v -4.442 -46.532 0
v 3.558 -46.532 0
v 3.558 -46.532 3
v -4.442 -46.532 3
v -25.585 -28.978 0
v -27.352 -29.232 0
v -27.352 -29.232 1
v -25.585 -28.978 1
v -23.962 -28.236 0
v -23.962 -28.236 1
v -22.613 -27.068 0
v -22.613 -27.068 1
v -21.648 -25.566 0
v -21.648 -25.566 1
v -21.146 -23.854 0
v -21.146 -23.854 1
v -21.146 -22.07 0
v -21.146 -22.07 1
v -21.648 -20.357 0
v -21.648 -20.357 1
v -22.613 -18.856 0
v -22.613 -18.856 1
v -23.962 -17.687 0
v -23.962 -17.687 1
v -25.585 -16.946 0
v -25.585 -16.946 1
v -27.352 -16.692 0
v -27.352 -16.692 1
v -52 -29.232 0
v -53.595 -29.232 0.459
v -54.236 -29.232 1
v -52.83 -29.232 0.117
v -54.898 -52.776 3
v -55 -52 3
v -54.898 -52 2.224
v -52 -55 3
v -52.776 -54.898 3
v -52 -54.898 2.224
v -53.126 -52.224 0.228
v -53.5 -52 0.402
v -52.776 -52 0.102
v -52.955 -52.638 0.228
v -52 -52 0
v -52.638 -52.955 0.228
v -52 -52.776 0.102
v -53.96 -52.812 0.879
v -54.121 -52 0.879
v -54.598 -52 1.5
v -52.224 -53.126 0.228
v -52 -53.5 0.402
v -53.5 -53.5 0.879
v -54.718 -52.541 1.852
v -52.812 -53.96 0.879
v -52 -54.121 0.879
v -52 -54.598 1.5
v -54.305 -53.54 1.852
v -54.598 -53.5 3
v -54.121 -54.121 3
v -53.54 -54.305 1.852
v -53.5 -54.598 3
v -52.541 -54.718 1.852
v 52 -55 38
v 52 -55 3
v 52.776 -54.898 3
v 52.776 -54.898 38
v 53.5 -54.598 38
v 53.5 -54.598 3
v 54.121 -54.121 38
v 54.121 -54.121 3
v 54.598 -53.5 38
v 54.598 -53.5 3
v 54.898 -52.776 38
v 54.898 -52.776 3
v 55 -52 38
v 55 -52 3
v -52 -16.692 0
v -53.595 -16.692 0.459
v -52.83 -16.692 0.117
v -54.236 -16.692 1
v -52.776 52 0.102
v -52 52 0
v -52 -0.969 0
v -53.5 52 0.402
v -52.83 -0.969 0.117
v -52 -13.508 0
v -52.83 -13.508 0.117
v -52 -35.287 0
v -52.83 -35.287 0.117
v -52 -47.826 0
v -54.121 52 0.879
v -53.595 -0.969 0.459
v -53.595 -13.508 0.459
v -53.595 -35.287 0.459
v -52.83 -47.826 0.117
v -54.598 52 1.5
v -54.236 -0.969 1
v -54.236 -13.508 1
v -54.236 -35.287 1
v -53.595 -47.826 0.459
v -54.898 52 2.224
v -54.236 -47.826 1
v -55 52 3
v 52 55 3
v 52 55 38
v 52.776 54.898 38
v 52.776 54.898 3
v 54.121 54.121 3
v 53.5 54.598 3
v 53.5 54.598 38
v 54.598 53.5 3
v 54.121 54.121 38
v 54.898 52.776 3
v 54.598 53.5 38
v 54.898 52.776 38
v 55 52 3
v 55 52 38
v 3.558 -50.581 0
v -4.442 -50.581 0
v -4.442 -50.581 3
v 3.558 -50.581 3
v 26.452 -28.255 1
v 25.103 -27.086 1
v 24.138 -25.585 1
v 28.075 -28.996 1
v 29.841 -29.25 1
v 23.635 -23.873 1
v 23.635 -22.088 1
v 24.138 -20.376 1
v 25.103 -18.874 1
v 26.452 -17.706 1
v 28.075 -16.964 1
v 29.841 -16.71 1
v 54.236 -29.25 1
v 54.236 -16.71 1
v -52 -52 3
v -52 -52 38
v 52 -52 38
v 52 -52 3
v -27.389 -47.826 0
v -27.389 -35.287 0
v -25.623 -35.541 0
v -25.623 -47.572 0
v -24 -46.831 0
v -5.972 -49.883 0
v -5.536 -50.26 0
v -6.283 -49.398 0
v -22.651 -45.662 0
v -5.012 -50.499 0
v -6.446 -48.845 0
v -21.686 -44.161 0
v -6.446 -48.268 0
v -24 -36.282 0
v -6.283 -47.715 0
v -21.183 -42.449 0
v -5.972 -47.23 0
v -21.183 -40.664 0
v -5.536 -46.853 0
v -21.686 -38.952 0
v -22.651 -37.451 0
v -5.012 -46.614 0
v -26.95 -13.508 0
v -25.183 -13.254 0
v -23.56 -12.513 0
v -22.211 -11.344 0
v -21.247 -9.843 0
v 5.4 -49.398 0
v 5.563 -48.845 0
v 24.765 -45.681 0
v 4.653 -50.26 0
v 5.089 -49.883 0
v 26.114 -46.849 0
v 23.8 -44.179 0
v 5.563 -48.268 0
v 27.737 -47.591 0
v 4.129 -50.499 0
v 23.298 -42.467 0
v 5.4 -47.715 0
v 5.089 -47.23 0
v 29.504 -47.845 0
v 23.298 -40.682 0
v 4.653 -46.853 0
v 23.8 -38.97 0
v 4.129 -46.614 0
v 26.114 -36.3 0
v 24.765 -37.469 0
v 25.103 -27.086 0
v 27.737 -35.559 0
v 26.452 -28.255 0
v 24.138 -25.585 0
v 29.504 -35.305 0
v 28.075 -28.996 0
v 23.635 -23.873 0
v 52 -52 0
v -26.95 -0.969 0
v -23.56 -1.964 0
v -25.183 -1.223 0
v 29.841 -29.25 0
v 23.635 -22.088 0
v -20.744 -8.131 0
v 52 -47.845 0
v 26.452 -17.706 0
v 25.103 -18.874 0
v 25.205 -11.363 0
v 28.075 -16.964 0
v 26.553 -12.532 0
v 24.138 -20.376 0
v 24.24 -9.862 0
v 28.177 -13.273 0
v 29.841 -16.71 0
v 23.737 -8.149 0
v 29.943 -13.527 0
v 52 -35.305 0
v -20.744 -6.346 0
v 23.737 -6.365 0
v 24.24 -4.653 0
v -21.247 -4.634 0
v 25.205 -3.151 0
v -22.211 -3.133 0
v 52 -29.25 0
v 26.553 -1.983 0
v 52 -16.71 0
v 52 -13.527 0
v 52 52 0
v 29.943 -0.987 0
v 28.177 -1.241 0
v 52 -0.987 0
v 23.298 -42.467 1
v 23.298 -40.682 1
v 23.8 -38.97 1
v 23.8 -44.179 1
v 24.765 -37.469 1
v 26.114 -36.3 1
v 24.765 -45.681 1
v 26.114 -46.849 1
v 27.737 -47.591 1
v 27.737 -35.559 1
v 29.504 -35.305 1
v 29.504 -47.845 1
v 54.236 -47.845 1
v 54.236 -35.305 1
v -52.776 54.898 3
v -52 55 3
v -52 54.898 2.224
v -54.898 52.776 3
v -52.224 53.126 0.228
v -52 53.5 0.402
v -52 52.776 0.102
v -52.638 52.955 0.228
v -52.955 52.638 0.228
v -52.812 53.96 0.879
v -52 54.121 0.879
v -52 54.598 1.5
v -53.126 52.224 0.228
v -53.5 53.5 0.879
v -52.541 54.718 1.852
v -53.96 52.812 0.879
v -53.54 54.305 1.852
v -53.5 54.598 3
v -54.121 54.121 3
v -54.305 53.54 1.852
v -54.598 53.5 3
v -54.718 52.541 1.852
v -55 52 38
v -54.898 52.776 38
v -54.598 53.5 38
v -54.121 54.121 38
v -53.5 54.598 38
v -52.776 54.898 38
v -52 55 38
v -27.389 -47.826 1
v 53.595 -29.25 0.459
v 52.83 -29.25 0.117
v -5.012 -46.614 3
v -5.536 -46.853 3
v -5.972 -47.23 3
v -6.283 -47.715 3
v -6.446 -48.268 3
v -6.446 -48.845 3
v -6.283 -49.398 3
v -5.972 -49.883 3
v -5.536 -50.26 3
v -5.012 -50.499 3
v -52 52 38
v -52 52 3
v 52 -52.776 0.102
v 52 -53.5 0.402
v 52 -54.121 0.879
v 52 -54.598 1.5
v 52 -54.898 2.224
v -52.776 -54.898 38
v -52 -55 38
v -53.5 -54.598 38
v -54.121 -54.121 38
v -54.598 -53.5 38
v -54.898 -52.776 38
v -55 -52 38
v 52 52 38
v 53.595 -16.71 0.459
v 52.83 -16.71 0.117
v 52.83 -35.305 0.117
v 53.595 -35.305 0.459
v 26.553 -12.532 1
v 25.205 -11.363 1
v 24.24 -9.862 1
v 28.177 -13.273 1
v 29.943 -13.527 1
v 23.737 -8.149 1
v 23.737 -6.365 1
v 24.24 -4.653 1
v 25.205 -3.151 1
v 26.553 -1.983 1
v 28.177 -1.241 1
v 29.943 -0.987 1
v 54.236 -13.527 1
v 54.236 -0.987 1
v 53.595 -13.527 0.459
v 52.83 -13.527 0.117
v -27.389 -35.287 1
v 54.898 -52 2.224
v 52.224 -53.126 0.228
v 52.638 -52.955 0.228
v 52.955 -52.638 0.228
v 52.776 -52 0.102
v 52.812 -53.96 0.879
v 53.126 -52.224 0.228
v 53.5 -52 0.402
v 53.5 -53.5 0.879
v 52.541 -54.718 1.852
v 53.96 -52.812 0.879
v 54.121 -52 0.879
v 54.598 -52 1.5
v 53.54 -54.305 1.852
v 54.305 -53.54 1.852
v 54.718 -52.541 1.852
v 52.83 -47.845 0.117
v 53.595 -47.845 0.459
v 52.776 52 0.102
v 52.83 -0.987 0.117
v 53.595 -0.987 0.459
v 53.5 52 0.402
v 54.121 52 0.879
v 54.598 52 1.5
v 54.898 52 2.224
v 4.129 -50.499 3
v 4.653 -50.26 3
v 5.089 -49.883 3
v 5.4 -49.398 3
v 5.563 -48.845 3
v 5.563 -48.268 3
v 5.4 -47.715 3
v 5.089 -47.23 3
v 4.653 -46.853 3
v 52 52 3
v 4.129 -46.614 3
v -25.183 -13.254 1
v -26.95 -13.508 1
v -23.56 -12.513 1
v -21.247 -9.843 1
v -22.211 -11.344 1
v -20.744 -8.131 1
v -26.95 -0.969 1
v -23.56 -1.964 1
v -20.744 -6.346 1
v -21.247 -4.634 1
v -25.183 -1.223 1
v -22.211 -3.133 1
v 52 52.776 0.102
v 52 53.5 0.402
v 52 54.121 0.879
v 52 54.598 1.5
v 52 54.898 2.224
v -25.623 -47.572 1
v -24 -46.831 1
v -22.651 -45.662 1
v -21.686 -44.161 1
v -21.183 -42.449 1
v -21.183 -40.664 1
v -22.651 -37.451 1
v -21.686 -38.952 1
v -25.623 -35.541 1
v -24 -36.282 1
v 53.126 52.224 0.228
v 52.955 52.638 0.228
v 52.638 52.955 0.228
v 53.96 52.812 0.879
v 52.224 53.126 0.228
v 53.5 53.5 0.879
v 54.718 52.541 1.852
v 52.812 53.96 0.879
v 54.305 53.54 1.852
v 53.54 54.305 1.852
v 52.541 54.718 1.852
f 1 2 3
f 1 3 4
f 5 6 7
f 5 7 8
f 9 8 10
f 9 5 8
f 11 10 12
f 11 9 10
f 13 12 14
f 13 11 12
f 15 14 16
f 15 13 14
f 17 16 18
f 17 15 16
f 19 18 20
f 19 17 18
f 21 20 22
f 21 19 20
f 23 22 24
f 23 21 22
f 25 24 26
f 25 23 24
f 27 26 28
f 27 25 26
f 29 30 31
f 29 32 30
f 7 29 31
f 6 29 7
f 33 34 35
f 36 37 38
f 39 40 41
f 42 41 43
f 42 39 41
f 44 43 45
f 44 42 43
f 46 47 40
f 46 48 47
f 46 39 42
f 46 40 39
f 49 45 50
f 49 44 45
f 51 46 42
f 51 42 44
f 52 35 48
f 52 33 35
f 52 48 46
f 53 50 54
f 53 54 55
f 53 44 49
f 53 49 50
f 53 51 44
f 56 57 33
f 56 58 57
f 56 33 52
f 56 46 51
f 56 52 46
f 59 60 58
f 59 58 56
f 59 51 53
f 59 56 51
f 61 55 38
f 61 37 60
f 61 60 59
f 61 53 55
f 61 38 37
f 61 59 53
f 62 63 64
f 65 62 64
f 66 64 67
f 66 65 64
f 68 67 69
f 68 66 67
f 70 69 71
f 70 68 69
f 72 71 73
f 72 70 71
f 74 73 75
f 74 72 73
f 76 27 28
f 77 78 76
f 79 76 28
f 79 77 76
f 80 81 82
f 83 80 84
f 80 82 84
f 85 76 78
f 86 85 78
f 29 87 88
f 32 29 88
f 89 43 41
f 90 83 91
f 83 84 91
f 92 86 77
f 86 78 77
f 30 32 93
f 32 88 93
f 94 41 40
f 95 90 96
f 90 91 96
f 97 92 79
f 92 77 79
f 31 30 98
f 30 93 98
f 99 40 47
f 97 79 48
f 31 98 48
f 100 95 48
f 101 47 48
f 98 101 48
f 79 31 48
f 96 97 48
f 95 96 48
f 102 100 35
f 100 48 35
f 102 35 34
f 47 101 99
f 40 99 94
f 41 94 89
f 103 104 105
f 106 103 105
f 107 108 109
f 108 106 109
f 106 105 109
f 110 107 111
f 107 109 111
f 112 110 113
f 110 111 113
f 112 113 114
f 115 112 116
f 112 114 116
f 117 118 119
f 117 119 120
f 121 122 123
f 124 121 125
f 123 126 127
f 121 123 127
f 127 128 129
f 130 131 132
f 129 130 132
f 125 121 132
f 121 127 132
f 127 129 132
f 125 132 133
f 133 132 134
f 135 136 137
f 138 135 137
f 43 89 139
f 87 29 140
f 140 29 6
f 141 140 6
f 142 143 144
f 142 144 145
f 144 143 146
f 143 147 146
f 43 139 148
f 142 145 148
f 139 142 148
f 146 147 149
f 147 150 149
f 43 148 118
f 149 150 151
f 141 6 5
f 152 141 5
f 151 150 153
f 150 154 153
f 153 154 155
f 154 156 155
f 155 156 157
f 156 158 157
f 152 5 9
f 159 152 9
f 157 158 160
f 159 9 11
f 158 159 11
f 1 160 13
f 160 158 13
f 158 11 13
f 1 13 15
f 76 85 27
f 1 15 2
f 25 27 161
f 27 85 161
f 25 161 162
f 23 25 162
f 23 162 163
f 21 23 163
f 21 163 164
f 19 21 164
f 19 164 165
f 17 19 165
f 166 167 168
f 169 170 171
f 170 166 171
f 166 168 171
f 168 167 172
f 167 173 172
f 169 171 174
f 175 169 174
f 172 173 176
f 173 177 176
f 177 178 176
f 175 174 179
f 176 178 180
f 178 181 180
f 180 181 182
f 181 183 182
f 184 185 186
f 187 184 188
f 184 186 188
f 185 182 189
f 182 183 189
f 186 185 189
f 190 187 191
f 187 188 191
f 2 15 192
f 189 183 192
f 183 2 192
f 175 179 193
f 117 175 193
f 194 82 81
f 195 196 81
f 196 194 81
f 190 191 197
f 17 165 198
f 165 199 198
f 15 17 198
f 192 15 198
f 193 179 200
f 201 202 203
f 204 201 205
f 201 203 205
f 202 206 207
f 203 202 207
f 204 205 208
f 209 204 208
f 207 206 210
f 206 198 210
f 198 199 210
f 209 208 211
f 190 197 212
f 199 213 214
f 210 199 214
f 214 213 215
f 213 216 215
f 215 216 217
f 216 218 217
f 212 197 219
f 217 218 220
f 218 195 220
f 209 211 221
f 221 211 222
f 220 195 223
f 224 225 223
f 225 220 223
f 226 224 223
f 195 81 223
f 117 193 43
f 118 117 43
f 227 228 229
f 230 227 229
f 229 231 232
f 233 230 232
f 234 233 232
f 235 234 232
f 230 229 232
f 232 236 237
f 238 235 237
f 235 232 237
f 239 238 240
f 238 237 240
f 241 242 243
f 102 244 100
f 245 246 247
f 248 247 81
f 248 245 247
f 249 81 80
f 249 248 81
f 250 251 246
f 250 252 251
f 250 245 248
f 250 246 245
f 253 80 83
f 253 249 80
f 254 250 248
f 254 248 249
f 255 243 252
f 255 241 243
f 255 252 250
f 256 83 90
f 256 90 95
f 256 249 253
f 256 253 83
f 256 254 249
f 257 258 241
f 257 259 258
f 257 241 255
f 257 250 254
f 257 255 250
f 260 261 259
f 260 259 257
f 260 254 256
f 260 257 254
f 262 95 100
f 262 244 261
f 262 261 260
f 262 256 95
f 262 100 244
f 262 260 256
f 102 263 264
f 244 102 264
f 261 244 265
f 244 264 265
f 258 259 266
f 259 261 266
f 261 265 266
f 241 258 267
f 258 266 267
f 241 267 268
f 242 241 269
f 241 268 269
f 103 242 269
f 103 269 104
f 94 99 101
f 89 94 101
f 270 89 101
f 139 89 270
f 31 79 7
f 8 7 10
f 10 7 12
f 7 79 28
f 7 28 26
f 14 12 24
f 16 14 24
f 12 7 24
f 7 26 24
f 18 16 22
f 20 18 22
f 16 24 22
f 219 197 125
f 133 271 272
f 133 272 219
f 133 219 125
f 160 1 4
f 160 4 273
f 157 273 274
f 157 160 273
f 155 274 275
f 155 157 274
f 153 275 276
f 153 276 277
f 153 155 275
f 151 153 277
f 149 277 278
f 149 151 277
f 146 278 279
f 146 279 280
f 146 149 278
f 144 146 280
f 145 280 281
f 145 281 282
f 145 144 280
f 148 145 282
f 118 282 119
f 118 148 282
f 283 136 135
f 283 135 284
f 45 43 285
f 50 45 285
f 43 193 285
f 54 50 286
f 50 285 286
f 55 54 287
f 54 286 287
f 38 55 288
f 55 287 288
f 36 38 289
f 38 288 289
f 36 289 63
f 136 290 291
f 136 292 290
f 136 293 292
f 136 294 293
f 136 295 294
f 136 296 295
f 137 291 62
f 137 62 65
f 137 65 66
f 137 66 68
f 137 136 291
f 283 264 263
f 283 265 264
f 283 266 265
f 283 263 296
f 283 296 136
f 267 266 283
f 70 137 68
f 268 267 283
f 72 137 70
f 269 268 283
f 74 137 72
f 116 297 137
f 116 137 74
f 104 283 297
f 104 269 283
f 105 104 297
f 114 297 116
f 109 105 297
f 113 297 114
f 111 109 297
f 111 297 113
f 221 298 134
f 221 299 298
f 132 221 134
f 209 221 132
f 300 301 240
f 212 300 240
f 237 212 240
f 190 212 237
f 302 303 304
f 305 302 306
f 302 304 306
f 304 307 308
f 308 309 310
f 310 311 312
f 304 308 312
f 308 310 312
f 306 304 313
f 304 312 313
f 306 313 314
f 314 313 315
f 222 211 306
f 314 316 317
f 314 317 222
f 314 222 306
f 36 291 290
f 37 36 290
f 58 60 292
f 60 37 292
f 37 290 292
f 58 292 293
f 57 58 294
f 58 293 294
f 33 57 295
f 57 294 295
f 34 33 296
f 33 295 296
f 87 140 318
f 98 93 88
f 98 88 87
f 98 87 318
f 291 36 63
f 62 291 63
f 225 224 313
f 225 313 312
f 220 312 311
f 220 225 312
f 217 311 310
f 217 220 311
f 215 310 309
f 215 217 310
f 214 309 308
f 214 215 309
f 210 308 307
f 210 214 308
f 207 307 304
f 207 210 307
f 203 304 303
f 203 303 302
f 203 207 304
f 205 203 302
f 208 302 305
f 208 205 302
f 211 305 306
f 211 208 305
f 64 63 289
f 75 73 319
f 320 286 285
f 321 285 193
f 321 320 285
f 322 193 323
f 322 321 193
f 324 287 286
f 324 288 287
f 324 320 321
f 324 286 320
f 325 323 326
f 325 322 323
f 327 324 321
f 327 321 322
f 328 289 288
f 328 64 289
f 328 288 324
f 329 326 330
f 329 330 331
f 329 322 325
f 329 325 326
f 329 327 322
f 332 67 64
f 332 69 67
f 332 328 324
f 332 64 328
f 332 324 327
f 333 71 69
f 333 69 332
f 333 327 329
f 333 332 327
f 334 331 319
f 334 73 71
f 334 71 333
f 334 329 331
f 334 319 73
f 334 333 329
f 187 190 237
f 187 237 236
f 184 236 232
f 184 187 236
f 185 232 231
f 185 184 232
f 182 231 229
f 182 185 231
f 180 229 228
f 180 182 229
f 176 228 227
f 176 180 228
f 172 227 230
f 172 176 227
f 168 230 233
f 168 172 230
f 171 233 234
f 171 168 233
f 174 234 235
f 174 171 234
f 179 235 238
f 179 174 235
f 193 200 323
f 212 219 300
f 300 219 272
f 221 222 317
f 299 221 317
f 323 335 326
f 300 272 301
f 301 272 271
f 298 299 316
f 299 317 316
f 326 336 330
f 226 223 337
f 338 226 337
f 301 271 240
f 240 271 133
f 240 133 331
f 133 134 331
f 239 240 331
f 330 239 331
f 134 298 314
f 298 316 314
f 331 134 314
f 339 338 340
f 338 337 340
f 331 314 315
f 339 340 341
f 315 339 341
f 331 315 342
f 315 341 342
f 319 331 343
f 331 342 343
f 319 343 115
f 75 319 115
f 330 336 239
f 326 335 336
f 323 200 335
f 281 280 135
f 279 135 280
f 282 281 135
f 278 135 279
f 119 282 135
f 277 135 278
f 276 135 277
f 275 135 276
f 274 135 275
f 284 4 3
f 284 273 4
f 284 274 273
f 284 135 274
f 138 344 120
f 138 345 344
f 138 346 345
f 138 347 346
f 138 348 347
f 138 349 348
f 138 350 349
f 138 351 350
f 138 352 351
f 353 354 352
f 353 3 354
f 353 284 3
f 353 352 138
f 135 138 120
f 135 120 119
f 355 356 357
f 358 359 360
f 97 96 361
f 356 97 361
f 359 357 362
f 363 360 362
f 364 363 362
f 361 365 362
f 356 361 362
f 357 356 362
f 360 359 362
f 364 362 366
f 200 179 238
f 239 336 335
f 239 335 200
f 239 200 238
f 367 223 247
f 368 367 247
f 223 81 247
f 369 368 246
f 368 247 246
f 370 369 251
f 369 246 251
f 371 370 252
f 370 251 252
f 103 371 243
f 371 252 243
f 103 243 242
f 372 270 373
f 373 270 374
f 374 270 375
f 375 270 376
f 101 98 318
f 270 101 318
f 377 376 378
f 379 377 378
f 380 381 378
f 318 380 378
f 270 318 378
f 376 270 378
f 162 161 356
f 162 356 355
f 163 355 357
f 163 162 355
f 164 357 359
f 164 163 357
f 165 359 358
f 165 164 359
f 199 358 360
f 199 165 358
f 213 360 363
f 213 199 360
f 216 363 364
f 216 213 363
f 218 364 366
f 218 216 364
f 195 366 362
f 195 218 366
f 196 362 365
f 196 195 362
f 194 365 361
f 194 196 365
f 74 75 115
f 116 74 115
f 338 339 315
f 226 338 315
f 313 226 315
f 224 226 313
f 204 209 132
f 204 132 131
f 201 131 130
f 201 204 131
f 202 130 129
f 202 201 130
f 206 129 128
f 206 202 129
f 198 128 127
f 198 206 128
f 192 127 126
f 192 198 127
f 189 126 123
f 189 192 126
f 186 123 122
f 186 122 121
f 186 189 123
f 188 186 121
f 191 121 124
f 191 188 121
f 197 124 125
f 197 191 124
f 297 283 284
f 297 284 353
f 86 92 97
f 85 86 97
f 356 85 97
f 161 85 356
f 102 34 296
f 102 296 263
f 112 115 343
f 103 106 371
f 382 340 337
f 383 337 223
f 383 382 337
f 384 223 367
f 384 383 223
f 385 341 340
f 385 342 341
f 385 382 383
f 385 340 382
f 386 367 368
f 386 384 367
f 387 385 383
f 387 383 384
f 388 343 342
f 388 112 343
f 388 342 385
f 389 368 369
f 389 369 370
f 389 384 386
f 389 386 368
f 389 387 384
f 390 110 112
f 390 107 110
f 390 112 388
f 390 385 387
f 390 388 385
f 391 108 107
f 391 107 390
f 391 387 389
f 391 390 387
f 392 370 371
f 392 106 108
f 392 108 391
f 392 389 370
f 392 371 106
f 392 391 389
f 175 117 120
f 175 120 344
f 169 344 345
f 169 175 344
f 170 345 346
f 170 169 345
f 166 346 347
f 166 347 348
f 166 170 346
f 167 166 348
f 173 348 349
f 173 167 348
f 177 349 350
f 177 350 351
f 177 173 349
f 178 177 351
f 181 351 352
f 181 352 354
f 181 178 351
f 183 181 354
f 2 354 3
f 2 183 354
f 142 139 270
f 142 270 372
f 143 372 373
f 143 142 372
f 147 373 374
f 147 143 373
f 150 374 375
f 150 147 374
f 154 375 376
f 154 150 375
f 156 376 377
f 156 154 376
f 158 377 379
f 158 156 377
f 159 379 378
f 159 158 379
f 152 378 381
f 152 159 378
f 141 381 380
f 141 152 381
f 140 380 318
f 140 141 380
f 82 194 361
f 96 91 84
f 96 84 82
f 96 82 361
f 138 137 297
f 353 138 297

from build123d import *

# Parameters (mm, degrees)
SKETCH_1_W          = 110
SKETCH_1_H          = 110
EXTRUDE_1_DEPTH     = 38
SKETCH_3_W          = 104
SKETCH_3_H          = 104
CUT_EXTRUDE_1_DEPTH = 32
FILLET_1_R          = 3
FILLET_2_R          = 3
CUT_EXTRUDE_2_DEPTH = 85.107074613
FILLET_3_R          = 3
CUT_EXTRUDE_4_DEPTH = 1
CUT_EXTRUDE_5_DEPTH = 3
SKETCH_13_W         = 104
SKETCH_13_H         = 104
CUT_EXTRUDE_6_DEPTH = 3


with BuildPart() as part:
    # 草图1 → 凸台-拉伸1 (new body)
    with BuildSketch(Plane.XY):
        Rectangle(SKETCH_1_W, SKETCH_1_H)
    extrude(amount=EXTRUDE_1_DEPTH)

    # 草图3 → 切除-拉伸1 (cut)
    with BuildSketch(Plane.XY.offset(38)):
        Rectangle(SKETCH_3_W, SKETCH_3_H)
    extrude(amount=-CUT_EXTRUDE_1_DEPTH, mode=Mode.SUBTRACT)

    # 圆角1
    fillet_1_edges = [part.edges().sort_by_distance(p)[0] for p in [
        (55, -55, 19),
        (55, 55, 19),
    ]]
    fillet(fillet_1_edges, radius=FILLET_1_R)

    # 圆角2
    fillet_2_edges = [part.edges().sort_by_distance(p)[0] for p in [
        (-55, 55, 19),
        (-55, -55, 19),
    ]]
    fillet(fillet_2_edges, radius=FILLET_2_R)

    # 草图4 → 切除-拉伸2 (cut, through all)
    with BuildSketch(Plane.XY.offset(6)):
        with BuildLine():
            Line((-3.909141934, -47.255379726), (3.909141934, -47.255379726))
            ThreePointArc((3.909141934, -47.255379726), (5.159141934, -48.505379726), (3.909141934, -49.755379726))
            Line((3.909141934, -49.755379726), (-3.909141934, -49.755379726))
            ThreePointArc((-3.909141934, -49.755379726), (-5.159141934, -48.505379726), (-3.909141934, -47.255379726))
        make_face()
    extrude(amount=-CUT_EXTRUDE_2_DEPTH, mode=Mode.SUBTRACT)

    # 圆角3
    fillet_3_edges = [part.edges().sort_by_distance(p)[0] for p in [
        (55, 0, 0),
        (54.121320344, 54.121320344, 0),
        (54.121320344, -54.121320344, 0),
        (0, -55, 0),
        (-55, 0, 0),
        (0, 55, 0),
        (-54.121320344, 54.121320344, 0),
        (-54.121320344, -54.121320344, 0),
    ]]
    fillet(fillet_3_edges, radius=FILLET_3_R)

    # 草图7 → 切除-拉伸4 (cut)
    with BuildSketch(Plane(origin=(0, 0, 0), x_dir=(-1, 0, 0), z_dir=(0, 0, -1))):
        with BuildLine():
            Line((27.351581896, -16.692025534), (72.045241502, -16.692025534))
            ThreePointArc((72.045241502, -16.692025534), (78.315018535, -22.961802567), (72.045241502, -29.231579599))
            Line((72.045241502, -29.231579599), (27.351581896, -29.231579599))
            ThreePointArc((27.351581896, -29.231579599), (21.081804864, -22.961802567), (27.351581896, -16.692025534))
        make_face()
        with BuildLine():
            Line((27.389277991, -35.286565578), (72.382937597, -35.286565578))
            ThreePointArc((72.382937597, -35.286565578), (78.652714629, -41.556342611), (72.382937597, -47.826119643))
            Line((72.382937597, -47.826119643), (27.389277991, -47.826119643))
            ThreePointArc((27.389277991, -47.826119643), (21.119500958, -41.556342611), (27.389277991, -35.286565578))
        make_face()
        with BuildLine():
            Line((26.949815907, -0.968873845), (71.943475513, -0.968873845))
            ThreePointArc((71.943475513, -0.968873845), (78.213252546, -7.238650877), (71.943475513, -13.50842791))
            Line((71.943475513, -13.50842791), (26.949815907, -13.50842791))
            ThreePointArc((26.949815907, -13.50842791), (20.680038875, -7.238650877), (26.949815907, -0.968873845))
        make_face()
        with BuildLine():
            Line((-74.834862022, -16.710464099), (-29.841202416, -16.710464099))
            ThreePointArc((-29.841202416, -16.710464099), (-23.571425383, -22.980241131), (-29.841202416, -29.250018164))
            Line((-29.841202416, -29.250018164), (-74.834862022, -29.250018164))
            ThreePointArc((-74.834862022, -29.250018164), (-81.104639054, -22.980241131), (-74.834862022, -16.710464099))
        make_face()
        with BuildLine():
            Line((-74.497165928, -35.305004142), (-29.503506322, -35.305004142))
            ThreePointArc((-29.503506322, -35.305004142), (-23.233729289, -41.574781175), (-29.503506322, -47.844558208))
            Line((-29.503506322, -47.844558208), (-74.497165928, -47.844558208))
            ThreePointArc((-74.497165928, -47.844558208), (-80.76694296, -41.574781175), (-74.497165928, -35.305004142))
        make_face()
        with BuildLine():
            Line((-74.936628011, -0.987312409), (-29.942968405, -0.987312409))
            ThreePointArc((-29.942968405, -0.987312409), (-23.673191373, -7.257089442), (-29.942968405, -13.526866474))
            Line((-29.942968405, -13.526866474), (-74.936628011, -13.526866474))
            ThreePointArc((-74.936628011, -13.526866474), (-81.206405044, -7.257089442), (-74.936628011, -0.987312409))
        make_face()
    extrude(amount=-CUT_EXTRUDE_4_DEPTH, mode=Mode.SUBTRACT)

    # 草图10 → 切除-拉伸5 (cut)
    with BuildSketch(Plane(origin=(0, 0, 0), x_dir=(-1, 0, 0), z_dir=(0, 0, -1))):
        with BuildLine():
            Line((-3.558455997, -46.531518088), (4.441544003, -46.531518088))
            ThreePointArc((4.441544003, -46.531518088), (6.466487551, -48.556461636), (4.441544003, -50.581405184))
            Line((4.441544003, -50.581405184), (-3.558455997, -50.581405184))
            ThreePointArc((-3.558455997, -50.581405184), (-5.583399545, -48.556461636), (-3.558455997, -46.531518088))
        make_face()
    extrude(amount=-CUT_EXTRUDE_5_DEPTH, mode=Mode.SUBTRACT)

    # 草图13 → 切除-拉伸6 (cut)
    with BuildSketch(Plane.XY.offset(6)):
        Rectangle(SKETCH_13_W, SKETCH_13_H)
    extrude(amount=-CUT_EXTRUDE_6_DEPTH, mode=Mode.SUBTRACT)


solid = part.part
